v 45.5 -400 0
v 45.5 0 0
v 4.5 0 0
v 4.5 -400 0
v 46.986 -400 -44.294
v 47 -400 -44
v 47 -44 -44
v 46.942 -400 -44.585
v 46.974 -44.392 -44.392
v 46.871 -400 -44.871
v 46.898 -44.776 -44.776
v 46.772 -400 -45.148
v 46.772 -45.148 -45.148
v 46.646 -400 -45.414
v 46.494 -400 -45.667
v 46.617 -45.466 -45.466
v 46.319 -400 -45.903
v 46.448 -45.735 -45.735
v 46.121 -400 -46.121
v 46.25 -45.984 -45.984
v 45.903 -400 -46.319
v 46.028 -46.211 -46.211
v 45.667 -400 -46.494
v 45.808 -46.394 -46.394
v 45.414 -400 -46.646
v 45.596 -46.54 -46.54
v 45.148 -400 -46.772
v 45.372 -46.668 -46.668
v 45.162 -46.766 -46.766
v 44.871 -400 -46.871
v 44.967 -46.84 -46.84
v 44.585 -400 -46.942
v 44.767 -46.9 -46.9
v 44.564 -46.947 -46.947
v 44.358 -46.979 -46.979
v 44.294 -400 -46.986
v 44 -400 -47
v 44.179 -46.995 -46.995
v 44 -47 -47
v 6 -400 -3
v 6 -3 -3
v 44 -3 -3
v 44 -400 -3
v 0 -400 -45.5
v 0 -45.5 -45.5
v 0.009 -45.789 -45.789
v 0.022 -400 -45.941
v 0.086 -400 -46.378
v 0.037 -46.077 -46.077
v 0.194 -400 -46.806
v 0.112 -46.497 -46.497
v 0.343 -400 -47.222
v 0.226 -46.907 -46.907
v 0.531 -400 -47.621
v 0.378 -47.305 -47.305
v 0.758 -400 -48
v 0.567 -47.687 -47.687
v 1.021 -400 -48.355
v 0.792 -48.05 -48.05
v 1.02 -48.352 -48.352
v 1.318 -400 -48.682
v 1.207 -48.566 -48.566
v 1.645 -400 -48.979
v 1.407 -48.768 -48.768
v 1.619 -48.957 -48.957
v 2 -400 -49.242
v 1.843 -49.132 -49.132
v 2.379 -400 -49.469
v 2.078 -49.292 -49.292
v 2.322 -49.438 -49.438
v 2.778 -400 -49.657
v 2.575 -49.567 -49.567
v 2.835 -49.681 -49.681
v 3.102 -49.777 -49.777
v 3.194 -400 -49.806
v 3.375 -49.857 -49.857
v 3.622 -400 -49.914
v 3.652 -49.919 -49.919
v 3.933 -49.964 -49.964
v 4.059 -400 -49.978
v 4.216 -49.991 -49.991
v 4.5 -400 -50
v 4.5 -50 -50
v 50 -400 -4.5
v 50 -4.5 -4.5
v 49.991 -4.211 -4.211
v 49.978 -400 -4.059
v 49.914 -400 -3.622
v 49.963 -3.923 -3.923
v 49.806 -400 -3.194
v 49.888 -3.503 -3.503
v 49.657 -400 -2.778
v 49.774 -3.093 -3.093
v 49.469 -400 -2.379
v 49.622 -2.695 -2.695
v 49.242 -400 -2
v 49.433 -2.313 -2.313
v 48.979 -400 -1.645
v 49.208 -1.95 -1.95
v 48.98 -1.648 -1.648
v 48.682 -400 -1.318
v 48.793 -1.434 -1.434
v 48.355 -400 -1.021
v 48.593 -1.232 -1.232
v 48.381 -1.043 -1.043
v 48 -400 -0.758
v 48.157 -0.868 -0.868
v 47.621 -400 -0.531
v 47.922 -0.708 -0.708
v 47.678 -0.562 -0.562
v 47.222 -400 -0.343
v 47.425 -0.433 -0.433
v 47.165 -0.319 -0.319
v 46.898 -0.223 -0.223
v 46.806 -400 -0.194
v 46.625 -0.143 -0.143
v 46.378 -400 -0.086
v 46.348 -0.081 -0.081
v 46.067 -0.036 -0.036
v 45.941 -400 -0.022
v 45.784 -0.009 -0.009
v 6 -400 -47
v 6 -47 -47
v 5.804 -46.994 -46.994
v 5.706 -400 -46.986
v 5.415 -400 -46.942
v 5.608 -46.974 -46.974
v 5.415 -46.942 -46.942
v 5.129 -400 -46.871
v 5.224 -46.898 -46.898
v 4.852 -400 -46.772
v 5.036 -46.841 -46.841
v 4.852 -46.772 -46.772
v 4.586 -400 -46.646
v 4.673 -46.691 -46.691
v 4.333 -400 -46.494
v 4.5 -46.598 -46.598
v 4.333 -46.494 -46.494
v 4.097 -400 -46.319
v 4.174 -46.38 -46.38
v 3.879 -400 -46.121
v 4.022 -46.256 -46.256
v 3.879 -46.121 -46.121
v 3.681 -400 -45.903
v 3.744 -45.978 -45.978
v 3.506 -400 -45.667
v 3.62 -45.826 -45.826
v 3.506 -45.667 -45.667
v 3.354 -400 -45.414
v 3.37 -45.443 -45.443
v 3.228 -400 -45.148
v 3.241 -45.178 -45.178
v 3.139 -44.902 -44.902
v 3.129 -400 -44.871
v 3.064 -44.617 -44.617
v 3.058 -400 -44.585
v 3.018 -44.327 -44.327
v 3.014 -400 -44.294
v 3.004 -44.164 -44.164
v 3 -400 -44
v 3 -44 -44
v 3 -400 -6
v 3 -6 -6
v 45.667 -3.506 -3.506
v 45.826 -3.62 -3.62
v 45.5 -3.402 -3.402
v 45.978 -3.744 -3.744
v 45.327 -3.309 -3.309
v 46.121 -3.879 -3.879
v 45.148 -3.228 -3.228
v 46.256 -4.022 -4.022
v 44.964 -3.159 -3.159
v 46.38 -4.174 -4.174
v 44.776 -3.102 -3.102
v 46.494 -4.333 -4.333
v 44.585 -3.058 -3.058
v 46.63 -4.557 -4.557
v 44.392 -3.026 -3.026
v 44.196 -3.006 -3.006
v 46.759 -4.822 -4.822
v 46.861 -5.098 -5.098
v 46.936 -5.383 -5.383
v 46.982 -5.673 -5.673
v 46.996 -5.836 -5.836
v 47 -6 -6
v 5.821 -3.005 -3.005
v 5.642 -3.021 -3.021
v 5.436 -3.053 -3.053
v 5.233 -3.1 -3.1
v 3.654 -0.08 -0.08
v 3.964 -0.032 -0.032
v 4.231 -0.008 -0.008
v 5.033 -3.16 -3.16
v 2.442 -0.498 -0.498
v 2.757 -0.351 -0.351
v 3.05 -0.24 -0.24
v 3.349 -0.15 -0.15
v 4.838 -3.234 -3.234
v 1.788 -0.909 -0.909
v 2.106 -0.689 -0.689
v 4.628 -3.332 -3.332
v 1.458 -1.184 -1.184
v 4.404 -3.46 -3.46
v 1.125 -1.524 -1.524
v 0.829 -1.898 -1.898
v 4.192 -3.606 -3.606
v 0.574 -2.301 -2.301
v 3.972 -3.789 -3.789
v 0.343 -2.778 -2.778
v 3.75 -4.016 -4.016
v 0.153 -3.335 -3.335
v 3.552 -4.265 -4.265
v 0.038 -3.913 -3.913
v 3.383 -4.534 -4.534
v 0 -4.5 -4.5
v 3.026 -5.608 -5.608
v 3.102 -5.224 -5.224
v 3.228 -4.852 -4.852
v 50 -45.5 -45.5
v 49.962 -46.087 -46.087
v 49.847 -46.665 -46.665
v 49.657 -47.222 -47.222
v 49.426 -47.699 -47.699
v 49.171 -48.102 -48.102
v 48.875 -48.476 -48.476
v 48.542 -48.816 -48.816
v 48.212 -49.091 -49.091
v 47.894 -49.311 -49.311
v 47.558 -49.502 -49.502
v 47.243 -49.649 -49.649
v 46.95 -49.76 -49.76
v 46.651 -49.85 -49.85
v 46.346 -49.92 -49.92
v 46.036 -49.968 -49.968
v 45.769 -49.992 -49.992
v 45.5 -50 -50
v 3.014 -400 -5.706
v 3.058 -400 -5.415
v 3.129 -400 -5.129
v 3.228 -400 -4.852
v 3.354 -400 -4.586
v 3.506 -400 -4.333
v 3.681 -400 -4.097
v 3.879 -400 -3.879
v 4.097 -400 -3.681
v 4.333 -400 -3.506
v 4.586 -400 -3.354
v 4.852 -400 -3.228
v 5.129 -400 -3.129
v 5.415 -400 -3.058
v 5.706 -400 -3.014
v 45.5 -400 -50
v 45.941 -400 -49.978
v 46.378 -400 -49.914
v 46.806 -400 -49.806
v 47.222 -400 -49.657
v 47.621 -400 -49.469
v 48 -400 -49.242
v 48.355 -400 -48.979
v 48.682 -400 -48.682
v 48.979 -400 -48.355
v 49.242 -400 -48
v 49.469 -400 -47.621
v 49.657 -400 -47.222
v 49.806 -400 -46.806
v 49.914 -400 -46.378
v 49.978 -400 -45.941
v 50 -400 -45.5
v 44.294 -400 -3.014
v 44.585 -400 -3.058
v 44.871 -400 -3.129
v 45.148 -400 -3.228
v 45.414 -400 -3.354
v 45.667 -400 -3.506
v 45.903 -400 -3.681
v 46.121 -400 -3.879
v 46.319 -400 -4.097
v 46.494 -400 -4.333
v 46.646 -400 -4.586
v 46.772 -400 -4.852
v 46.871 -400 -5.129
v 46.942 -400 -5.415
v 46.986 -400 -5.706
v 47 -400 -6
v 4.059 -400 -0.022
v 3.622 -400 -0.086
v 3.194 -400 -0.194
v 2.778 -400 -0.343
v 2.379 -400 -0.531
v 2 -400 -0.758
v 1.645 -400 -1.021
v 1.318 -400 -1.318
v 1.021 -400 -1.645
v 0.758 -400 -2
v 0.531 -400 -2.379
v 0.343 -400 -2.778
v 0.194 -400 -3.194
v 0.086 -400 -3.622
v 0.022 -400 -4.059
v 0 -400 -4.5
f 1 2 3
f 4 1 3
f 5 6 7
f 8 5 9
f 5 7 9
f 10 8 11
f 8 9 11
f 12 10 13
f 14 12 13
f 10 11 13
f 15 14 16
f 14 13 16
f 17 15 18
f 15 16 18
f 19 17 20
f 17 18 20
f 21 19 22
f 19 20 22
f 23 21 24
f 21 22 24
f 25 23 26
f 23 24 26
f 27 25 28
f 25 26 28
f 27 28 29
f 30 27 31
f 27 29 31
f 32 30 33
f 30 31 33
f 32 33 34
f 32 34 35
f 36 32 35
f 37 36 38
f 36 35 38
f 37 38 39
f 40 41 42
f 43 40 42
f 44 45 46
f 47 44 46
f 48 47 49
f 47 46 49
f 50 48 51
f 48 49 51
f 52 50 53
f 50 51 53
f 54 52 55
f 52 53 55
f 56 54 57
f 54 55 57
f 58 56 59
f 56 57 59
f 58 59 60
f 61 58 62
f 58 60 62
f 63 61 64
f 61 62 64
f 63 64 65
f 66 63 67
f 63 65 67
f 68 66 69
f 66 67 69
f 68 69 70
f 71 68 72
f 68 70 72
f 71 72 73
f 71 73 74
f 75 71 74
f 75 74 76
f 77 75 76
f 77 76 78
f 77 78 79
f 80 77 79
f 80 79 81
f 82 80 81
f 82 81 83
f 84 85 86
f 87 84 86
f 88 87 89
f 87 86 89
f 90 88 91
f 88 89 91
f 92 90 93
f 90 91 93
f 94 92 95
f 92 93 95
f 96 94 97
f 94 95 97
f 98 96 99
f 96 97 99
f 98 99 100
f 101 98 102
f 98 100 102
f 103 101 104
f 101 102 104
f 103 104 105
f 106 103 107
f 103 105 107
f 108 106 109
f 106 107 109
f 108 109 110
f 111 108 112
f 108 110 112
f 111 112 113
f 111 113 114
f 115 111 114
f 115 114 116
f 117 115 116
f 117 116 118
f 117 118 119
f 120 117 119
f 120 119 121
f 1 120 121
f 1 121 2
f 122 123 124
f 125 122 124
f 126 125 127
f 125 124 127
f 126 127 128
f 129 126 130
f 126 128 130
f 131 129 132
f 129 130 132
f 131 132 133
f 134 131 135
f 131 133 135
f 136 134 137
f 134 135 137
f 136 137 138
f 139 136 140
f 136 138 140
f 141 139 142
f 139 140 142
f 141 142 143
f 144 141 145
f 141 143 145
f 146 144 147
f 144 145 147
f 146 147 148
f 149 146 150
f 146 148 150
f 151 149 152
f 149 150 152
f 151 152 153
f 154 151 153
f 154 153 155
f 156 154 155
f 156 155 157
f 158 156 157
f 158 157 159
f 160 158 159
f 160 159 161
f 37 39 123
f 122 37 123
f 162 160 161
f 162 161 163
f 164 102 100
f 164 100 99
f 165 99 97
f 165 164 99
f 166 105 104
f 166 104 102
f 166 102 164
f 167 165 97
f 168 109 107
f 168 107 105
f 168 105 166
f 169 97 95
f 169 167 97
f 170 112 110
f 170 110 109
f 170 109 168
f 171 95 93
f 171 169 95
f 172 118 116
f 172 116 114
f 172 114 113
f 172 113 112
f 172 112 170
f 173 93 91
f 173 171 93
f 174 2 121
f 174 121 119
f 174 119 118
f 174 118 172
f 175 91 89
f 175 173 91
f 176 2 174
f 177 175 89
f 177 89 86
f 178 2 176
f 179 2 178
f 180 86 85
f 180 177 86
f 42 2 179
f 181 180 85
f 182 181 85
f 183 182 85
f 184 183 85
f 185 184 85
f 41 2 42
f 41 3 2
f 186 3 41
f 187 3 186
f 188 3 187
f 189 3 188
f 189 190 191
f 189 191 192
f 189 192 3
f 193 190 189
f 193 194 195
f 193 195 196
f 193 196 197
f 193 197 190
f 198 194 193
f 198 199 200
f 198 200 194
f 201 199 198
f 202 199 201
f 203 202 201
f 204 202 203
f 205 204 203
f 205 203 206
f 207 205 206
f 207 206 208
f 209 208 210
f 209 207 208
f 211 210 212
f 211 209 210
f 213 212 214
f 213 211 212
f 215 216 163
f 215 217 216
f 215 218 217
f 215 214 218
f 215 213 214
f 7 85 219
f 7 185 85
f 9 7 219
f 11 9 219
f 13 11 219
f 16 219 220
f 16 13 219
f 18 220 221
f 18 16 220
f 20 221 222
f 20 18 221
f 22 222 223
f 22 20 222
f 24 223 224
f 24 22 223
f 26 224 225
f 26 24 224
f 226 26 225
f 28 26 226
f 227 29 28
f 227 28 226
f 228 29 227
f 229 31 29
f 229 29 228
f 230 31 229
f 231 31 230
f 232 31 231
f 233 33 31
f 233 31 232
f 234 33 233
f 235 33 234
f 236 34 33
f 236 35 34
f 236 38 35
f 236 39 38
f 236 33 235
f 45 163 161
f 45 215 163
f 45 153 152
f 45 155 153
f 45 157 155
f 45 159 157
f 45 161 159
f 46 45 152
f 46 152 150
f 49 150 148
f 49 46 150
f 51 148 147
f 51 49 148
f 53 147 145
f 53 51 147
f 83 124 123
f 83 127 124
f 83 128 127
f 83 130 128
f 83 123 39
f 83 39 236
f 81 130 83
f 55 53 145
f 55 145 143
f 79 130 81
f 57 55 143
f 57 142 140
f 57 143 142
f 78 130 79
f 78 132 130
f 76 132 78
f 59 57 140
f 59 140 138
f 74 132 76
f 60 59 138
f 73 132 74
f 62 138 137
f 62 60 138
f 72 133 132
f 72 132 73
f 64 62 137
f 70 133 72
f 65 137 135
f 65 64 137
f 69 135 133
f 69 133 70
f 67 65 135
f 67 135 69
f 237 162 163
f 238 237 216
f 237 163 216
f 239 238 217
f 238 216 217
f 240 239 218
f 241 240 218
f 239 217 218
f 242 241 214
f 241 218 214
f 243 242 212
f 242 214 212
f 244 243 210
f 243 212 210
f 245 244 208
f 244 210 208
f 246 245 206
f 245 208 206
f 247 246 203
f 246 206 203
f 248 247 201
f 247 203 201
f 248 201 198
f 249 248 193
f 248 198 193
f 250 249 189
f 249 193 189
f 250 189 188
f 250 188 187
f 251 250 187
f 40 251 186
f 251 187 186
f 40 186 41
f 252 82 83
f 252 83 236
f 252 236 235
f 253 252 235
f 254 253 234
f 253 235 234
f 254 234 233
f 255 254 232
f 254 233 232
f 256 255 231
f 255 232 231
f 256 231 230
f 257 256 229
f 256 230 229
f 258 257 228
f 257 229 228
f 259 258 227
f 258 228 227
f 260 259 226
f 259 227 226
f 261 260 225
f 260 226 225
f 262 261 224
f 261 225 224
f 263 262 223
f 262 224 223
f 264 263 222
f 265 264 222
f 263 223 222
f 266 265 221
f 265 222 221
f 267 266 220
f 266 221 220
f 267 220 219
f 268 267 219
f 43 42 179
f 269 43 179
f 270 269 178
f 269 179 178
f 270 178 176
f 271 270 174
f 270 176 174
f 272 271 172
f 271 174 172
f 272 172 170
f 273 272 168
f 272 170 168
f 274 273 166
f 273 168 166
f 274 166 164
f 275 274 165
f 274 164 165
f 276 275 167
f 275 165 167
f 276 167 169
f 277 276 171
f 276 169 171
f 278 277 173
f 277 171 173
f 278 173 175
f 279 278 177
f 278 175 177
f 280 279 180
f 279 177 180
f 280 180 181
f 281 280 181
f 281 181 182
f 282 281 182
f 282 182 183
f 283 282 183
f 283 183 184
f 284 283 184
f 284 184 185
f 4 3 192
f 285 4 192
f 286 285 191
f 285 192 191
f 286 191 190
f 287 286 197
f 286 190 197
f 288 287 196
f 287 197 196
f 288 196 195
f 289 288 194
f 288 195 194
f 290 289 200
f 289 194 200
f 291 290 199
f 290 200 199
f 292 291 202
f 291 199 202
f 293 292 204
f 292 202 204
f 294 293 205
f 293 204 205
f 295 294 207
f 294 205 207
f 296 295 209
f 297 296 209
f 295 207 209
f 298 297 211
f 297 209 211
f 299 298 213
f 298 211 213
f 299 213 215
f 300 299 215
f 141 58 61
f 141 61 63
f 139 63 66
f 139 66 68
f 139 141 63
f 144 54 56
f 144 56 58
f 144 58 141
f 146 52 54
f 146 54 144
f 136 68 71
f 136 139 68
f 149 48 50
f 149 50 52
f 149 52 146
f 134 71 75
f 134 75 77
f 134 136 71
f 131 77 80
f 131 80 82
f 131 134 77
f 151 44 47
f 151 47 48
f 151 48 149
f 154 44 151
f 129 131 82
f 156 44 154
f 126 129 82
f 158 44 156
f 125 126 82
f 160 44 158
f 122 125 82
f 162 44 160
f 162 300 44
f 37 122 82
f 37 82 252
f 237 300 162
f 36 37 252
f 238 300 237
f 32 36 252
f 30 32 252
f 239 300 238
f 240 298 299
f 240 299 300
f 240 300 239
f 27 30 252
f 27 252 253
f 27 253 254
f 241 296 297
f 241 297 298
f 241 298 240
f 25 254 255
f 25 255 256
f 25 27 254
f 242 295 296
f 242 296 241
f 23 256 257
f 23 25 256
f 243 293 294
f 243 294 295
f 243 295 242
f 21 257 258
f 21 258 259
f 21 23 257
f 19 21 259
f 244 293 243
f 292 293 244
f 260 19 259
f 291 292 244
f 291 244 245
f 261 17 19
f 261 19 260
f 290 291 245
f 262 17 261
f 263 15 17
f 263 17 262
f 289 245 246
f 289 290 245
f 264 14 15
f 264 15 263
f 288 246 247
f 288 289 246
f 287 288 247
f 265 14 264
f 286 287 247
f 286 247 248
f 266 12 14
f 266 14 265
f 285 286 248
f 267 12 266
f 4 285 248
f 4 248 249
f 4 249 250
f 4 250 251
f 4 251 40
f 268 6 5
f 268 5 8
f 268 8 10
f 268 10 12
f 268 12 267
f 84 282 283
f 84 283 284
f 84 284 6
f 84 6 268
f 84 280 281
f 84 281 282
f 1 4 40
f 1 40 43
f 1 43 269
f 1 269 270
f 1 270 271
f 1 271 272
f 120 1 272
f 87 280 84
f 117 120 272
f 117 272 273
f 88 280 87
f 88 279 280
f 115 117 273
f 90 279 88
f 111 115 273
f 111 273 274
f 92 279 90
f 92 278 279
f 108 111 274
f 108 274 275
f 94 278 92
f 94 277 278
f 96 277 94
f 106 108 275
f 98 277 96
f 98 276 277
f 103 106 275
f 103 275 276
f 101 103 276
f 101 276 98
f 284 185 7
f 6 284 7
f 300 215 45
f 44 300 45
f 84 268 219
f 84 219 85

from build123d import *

# Parameters (mm, degrees)
F1_DEPTH = 400
F3_DEPTH = 50.001


# Not quite as in the source:
# - a feature names something its author has since deleted; it is built from what else it names


with BuildPart() as f1:
    # F0 (on Front) → F1 (new body)
    with BuildSketch(Plane.XZ):
        with BuildLine():
            Line((45.5, 0), (4.5, 0))
            ThreePointArc((4.5, 0), (1.3180194847, -1.3180194847), (0, -4.5))
            Line((0, -4.5), (0, -45.5))
            ThreePointArc((0, -45.5), (1.3180194847, -48.6819805153), (4.5, -50))
            Line((4.5, -50), (45.5, -50))
            ThreePointArc((45.5, -50), (48.6819805153, -48.6819805153), (50, -45.5))
            Line((50, -45.5), (50, -4.5))
            ThreePointArc((50, -4.5), (48.6819805153, -1.3180194847), (45.5, 0))
        make_face()
        with BuildLine():
            ThreePointArc((3, -6), (3.8786796564, -3.8786796564), (6, -3))
            Line((6, -3), (44, -3))
            ThreePointArc((44, -3), (46.1213203436, -3.8786796564), (47, -6))
            Line((47, -6), (47, -44))
            ThreePointArc((47, -44), (46.1213203436, -46.1213203436), (44, -47))
            Line((44, -47), (6, -47))
            ThreePointArc((6, -47), (3.8786796564, -46.1213203436), (3, -44))
            Line((3, -44), (3, -6))
        make_face(mode=Mode.SUBTRACT)
    extrude(amount=F1_DEPTH)

    # F2 (on Right) → F3 (cut, through all)
    with BuildSketch(Plane.YZ):
        Polygon((29.2893218813, 0), (0, 0), (-45.5, -45.5), (-70.7106781187, -70.7106781187), (29.2893218813, -70.7106781187), align=None)
    extrude(amount=F3_DEPTH, mode=Mode.SUBTRACT)


solid = f1.part
